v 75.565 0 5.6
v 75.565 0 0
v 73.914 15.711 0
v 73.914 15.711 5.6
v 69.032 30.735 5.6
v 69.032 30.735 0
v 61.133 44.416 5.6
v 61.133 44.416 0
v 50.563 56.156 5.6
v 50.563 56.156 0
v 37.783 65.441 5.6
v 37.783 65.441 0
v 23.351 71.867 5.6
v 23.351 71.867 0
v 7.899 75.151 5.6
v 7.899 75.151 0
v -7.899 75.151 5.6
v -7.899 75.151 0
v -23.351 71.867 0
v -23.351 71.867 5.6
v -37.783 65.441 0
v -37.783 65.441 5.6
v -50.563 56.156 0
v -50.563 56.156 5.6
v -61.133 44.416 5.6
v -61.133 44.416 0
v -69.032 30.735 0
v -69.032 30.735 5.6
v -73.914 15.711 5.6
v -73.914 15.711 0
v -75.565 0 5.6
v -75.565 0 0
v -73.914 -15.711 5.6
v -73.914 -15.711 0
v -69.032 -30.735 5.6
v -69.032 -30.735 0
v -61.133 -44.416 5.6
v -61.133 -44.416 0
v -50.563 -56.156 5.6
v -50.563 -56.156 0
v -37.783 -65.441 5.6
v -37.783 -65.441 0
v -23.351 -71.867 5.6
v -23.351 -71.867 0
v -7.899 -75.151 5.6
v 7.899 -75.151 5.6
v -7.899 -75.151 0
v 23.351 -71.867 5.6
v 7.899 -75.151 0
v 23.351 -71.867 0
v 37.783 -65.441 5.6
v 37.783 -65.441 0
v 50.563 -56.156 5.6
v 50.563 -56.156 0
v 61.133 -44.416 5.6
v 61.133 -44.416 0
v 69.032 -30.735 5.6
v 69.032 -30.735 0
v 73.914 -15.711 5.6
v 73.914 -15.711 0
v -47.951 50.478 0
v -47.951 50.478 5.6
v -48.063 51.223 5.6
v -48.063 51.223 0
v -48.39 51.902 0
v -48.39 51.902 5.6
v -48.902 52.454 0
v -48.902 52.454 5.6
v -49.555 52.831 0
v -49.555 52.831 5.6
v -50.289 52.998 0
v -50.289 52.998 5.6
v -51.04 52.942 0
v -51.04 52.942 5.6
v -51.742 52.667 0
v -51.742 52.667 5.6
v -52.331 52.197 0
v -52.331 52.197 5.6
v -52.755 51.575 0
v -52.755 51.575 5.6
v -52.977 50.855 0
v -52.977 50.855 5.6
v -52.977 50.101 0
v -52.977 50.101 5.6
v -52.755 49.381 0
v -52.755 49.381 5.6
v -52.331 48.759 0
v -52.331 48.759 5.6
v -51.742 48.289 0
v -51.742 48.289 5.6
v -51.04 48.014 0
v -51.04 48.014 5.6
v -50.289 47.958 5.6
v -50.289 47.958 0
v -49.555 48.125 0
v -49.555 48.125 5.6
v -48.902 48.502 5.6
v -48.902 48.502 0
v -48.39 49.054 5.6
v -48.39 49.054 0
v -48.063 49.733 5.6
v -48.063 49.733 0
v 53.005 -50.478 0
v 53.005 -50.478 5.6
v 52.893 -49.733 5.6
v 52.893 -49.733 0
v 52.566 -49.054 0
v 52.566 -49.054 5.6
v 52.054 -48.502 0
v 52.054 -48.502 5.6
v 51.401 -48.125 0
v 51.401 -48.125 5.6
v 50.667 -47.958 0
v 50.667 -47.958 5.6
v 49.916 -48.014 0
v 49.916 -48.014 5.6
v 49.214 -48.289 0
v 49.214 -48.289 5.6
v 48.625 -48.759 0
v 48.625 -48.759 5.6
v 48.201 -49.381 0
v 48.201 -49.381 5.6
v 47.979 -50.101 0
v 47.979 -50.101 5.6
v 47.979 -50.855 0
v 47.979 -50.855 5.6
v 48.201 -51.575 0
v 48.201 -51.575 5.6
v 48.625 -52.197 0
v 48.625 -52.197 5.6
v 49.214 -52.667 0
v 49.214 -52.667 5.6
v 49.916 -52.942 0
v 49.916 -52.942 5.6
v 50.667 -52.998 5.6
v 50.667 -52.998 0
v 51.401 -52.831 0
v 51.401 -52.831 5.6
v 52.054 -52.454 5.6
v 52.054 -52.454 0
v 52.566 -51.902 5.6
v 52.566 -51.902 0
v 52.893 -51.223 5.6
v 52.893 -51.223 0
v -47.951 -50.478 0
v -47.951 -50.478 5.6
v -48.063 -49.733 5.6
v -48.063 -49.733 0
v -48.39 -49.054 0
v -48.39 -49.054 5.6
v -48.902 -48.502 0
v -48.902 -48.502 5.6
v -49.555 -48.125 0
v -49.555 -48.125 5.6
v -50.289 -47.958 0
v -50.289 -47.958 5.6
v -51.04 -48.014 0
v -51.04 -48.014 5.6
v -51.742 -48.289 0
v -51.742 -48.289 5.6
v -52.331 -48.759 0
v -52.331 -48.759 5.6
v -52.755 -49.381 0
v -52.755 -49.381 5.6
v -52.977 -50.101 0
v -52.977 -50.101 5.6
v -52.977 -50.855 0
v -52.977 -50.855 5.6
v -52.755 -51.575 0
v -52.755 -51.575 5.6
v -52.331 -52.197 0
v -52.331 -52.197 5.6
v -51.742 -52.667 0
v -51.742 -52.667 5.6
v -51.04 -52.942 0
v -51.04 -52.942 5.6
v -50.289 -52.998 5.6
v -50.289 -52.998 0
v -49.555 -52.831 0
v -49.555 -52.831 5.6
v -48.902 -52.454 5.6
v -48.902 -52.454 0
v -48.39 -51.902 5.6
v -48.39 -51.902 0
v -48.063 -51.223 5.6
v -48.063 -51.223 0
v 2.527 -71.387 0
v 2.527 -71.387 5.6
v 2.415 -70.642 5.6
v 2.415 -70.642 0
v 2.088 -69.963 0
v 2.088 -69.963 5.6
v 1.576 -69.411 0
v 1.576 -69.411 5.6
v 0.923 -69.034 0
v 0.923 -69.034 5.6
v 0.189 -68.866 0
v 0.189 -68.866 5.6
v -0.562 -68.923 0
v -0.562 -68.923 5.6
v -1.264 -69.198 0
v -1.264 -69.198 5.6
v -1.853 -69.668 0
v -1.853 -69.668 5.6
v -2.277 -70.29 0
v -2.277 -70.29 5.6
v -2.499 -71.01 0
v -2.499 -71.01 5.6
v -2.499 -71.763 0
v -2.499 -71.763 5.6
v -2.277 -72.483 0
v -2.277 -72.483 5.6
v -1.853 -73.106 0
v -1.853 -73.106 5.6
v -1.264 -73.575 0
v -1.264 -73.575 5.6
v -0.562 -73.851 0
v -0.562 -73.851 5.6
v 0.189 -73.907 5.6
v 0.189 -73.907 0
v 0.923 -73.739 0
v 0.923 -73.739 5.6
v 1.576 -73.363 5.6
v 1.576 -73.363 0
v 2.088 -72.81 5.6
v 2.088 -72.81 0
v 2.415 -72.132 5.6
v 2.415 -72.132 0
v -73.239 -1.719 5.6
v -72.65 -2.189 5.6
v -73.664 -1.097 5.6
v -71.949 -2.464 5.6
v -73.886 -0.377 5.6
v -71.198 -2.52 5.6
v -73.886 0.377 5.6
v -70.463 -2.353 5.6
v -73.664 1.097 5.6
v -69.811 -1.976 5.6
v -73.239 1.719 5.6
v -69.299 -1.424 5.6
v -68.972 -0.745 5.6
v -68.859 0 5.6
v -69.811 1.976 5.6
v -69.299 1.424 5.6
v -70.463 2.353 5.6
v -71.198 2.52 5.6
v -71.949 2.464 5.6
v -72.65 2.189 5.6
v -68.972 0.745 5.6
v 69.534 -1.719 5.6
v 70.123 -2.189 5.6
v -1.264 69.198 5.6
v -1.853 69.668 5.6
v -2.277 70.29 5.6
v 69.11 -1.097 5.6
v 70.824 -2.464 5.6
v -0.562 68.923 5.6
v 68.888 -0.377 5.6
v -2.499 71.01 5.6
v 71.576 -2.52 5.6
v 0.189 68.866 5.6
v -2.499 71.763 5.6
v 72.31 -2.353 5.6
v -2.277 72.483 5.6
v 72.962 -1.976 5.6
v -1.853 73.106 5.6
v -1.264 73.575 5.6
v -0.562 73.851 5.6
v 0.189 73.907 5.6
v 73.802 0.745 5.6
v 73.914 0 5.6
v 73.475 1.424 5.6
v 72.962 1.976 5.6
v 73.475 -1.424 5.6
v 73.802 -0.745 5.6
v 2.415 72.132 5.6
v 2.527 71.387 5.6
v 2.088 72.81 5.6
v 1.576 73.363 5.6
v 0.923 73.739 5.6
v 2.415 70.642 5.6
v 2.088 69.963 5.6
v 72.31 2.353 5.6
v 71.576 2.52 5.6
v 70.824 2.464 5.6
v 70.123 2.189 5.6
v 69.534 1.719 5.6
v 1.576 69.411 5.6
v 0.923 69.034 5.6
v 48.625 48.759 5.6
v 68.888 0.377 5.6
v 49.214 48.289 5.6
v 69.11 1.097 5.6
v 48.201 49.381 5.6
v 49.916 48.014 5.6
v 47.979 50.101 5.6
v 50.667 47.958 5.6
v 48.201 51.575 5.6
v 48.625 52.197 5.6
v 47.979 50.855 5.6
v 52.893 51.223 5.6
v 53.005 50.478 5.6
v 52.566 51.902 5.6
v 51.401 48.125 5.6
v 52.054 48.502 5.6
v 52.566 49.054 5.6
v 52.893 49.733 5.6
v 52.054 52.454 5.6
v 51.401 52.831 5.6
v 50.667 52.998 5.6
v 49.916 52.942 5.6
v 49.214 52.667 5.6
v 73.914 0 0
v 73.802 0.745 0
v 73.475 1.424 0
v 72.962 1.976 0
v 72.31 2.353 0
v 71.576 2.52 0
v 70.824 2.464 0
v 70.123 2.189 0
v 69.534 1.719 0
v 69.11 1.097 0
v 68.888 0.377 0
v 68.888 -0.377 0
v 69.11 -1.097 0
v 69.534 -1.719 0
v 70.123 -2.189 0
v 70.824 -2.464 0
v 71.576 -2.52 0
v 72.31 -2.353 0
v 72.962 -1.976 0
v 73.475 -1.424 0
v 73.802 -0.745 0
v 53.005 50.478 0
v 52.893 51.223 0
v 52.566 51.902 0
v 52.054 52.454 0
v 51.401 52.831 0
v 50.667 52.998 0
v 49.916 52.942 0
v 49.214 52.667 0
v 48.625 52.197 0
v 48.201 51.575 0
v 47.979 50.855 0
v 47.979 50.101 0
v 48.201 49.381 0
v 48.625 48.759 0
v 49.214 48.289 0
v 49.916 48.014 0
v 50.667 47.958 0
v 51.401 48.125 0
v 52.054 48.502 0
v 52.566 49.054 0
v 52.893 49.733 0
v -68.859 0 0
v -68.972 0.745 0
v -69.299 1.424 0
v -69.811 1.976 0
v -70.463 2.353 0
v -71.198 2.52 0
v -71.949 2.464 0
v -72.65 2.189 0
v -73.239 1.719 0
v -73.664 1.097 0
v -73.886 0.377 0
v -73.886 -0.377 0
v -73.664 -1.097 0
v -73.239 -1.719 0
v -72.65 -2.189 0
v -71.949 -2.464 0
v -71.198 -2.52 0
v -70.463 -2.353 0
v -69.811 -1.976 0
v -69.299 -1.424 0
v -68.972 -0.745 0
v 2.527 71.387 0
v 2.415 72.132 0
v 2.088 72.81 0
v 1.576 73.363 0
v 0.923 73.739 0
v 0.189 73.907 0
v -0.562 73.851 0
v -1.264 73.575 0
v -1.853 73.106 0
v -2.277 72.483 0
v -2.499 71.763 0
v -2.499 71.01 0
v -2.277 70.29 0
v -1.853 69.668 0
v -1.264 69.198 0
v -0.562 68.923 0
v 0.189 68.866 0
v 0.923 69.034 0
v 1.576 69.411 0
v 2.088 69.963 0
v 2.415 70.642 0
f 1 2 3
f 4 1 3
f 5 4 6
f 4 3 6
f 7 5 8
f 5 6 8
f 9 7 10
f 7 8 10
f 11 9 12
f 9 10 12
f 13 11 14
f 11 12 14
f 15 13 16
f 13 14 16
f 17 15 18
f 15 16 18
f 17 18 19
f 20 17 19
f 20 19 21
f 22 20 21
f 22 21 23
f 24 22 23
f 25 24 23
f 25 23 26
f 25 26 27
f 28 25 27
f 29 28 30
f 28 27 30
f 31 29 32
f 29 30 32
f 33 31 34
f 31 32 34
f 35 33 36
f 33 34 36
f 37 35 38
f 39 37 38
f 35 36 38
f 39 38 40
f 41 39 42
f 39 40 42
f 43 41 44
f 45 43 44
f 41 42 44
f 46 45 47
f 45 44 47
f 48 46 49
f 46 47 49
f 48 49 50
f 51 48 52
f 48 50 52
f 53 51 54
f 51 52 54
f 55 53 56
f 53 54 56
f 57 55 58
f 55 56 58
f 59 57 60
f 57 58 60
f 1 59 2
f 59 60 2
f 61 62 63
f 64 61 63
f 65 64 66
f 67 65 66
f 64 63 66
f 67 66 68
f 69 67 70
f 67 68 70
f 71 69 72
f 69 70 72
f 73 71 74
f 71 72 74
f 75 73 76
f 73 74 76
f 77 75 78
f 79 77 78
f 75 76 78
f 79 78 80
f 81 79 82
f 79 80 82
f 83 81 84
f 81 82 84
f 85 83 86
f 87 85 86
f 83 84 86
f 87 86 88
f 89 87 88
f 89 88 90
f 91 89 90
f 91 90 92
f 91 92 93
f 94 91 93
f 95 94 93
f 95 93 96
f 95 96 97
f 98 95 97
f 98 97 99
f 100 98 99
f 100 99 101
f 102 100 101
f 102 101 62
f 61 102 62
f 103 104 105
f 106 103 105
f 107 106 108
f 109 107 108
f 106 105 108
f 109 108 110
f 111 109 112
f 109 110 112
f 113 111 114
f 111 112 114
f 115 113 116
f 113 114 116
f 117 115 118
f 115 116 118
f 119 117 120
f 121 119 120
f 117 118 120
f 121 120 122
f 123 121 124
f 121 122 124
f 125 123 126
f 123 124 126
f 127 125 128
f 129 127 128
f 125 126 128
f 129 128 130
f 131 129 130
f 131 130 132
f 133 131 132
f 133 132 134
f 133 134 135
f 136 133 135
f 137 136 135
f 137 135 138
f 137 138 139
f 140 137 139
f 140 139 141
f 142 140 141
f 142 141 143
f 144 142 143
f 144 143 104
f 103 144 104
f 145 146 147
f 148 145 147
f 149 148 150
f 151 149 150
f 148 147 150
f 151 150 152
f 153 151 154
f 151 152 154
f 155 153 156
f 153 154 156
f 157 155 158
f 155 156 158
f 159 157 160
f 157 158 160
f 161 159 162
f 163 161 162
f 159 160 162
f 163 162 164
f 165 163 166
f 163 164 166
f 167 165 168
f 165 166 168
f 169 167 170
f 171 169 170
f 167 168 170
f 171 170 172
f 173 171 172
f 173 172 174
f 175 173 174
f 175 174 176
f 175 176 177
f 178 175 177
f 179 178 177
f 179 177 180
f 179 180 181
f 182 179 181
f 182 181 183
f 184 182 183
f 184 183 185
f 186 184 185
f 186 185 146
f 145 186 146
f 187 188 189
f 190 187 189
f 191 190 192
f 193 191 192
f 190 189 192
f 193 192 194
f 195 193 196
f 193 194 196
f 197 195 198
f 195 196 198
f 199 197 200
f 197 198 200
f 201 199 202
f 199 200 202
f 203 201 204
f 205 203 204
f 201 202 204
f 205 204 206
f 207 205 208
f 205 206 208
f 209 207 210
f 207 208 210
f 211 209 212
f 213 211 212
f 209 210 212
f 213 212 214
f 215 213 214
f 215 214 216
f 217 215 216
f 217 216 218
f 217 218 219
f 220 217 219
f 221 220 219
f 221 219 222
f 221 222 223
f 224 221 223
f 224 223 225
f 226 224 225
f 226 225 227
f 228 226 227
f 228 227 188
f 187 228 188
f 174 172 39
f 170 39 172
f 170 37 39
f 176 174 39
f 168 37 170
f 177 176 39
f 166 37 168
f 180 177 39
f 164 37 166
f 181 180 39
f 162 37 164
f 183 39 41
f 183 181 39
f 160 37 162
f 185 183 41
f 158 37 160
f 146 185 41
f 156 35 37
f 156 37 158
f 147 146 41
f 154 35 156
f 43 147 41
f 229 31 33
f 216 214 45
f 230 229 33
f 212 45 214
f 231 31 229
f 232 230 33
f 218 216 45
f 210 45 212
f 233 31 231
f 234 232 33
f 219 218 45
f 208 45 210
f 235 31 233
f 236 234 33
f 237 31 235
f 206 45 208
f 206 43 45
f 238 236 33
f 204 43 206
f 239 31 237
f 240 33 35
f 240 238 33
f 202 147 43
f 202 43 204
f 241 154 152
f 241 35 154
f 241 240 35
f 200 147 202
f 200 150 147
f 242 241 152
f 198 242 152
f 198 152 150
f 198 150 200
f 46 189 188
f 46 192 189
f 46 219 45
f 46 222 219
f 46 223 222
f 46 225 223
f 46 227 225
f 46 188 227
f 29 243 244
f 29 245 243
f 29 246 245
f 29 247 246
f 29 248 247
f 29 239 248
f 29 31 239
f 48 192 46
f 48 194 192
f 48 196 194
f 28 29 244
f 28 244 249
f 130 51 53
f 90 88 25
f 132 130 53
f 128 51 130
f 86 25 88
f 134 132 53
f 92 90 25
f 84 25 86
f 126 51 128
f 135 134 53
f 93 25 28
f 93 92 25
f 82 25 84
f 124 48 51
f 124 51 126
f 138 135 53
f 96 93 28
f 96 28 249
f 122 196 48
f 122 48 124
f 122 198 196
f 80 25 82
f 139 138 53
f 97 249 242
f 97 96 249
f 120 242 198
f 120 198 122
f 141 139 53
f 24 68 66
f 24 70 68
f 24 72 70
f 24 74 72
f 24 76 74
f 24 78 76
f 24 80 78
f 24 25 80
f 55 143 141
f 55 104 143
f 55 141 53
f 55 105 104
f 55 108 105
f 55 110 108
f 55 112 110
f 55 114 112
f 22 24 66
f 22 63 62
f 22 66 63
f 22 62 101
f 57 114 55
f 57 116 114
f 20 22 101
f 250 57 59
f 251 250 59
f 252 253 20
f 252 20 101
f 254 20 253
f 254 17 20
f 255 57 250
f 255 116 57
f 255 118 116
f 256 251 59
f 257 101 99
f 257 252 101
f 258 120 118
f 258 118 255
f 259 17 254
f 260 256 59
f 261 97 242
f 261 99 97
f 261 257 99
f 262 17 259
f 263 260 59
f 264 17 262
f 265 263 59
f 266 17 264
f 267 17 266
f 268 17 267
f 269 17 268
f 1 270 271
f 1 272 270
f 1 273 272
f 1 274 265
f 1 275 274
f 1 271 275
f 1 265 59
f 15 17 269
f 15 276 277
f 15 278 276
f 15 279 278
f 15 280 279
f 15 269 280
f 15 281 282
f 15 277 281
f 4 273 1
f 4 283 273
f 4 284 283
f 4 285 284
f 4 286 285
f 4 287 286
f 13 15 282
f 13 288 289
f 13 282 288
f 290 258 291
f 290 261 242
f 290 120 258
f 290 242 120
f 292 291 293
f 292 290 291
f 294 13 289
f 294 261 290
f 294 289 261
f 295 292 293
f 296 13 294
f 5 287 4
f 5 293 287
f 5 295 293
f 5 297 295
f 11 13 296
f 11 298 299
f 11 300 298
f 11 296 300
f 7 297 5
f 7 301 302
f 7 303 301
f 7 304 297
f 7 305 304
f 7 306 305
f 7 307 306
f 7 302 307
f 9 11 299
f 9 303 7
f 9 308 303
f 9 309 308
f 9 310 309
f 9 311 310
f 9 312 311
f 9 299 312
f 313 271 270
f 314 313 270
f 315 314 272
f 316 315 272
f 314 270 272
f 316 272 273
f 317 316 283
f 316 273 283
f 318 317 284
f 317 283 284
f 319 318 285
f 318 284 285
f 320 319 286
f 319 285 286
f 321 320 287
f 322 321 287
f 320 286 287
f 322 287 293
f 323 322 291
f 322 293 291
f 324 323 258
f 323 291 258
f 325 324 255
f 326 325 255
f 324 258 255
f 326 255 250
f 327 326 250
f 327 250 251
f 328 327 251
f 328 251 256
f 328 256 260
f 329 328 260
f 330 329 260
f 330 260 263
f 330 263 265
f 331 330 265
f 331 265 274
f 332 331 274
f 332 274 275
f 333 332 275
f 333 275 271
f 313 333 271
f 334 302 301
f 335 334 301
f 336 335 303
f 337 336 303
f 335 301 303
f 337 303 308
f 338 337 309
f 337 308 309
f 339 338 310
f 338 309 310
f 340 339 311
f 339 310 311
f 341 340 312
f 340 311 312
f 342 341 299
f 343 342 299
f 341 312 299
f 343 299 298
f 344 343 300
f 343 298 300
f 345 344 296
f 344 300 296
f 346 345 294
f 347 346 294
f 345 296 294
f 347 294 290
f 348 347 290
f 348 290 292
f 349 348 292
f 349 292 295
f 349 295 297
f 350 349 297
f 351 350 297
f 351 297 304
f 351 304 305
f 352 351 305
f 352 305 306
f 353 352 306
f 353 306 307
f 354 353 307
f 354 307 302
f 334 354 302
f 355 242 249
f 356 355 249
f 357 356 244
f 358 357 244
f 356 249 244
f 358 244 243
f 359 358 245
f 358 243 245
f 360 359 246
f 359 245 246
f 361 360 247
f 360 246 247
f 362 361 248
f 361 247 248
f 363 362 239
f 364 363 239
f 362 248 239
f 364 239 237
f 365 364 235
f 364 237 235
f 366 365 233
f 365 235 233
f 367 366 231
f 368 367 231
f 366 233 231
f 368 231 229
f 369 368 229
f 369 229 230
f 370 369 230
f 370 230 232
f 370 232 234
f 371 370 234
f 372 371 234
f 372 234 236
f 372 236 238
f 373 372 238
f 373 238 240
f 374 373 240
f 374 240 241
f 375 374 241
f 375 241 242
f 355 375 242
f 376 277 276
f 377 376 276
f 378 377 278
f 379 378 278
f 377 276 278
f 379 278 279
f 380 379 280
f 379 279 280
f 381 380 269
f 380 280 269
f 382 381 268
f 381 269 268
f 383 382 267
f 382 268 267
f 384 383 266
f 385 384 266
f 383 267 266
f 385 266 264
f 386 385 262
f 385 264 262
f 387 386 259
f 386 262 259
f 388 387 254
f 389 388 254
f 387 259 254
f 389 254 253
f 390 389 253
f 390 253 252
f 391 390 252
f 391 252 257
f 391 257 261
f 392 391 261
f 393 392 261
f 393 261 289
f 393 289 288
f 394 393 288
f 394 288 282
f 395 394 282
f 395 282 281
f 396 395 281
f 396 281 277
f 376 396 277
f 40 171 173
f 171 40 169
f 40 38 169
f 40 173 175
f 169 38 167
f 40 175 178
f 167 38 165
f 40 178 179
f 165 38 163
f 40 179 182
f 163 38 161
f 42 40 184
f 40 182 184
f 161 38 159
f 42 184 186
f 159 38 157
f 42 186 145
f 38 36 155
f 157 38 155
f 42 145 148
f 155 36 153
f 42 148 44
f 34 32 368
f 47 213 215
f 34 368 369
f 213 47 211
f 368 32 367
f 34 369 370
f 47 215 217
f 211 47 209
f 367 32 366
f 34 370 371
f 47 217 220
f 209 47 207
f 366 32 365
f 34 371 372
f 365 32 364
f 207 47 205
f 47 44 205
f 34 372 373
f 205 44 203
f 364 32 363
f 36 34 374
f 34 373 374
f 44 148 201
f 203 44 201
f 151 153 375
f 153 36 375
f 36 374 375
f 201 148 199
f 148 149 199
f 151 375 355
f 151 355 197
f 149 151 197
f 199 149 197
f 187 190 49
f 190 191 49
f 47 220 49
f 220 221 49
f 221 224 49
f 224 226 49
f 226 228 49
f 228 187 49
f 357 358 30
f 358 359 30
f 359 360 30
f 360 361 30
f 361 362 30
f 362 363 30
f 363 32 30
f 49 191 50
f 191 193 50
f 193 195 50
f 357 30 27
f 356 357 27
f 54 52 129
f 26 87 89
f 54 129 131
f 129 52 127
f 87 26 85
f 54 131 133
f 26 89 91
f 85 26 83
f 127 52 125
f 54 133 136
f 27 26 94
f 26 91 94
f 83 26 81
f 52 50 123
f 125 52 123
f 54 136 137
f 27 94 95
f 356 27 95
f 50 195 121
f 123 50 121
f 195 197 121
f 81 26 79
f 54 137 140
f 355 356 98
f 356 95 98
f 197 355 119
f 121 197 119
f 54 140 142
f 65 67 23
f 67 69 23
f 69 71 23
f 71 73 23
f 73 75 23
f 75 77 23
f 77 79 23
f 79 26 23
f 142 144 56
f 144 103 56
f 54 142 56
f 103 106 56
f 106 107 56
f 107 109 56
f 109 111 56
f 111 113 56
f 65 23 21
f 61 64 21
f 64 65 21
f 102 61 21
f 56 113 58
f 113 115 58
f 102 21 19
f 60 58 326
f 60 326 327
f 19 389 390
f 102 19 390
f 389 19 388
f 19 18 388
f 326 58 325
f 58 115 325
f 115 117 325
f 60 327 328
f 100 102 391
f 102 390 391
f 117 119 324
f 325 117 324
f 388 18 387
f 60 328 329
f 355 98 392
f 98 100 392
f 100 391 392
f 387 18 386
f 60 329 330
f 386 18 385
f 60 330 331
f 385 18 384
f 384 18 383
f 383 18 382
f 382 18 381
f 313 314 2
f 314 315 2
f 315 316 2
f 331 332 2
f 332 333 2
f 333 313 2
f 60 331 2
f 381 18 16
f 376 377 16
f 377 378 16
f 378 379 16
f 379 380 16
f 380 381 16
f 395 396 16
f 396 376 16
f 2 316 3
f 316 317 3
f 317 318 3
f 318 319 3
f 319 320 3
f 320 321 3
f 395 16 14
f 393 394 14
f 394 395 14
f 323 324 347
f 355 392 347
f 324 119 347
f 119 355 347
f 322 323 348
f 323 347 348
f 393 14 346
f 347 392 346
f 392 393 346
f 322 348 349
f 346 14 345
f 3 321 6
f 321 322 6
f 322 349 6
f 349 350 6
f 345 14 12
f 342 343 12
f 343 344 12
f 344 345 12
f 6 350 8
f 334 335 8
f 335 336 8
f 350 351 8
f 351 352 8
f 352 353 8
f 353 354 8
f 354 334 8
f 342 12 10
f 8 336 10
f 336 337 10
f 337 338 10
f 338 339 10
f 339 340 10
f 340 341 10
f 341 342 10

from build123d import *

# Parameters (mm, degrees)
SKETCH1_R                      = 75.565
BOSS_EXTRUDE1_DEPTH            = 5.6
F_8_0_199_DIAMETER_HOLE1_D     = 5.0546
F_8_0_199_DIAMETER_HOLE1_DEPTH = 8.481444958
F_8_0_199_DIAMETER_HOLE1_TIP   = 1.518555042


with BuildPart() as part:
    # Sketch1 → Boss-Extrude1 (new body)
    with BuildSketch(Plane.XY):
        Circle(SKETCH1_R)
    extrude(amount=BOSS_EXTRUDE1_DEPTH)

    # #8 (0.199) Diameter Hole1
    with Locations(Plane(origin=(0, 0, 0), x_dir=(-1, 0, 0), z_dir=(0, 0, -1))):
        with Locations((-50.478019657, 50.478019657), (0, 71.3867), (50.478019657, 50.478019657), (71.3867, 0), (50.478019657, -50.478019657), (0, -71.3867), (-50.478019657, -50.478019657), (-71.3867, 0)):
            Hole(F_8_0_199_DIAMETER_HOLE1_D / 2, depth=F_8_0_199_DIAMETER_HOLE1_DEPTH)
            with Locations((0, 0, -(F_8_0_199_DIAMETER_HOLE1_DEPTH + F_8_0_199_DIAMETER_HOLE1_TIP / 2))):  # 118° drill point
                Cone(0, F_8_0_199_DIAMETER_HOLE1_D / 2, F_8_0_199_DIAMETER_HOLE1_TIP, mode=Mode.SUBTRACT)


solid = part.part
